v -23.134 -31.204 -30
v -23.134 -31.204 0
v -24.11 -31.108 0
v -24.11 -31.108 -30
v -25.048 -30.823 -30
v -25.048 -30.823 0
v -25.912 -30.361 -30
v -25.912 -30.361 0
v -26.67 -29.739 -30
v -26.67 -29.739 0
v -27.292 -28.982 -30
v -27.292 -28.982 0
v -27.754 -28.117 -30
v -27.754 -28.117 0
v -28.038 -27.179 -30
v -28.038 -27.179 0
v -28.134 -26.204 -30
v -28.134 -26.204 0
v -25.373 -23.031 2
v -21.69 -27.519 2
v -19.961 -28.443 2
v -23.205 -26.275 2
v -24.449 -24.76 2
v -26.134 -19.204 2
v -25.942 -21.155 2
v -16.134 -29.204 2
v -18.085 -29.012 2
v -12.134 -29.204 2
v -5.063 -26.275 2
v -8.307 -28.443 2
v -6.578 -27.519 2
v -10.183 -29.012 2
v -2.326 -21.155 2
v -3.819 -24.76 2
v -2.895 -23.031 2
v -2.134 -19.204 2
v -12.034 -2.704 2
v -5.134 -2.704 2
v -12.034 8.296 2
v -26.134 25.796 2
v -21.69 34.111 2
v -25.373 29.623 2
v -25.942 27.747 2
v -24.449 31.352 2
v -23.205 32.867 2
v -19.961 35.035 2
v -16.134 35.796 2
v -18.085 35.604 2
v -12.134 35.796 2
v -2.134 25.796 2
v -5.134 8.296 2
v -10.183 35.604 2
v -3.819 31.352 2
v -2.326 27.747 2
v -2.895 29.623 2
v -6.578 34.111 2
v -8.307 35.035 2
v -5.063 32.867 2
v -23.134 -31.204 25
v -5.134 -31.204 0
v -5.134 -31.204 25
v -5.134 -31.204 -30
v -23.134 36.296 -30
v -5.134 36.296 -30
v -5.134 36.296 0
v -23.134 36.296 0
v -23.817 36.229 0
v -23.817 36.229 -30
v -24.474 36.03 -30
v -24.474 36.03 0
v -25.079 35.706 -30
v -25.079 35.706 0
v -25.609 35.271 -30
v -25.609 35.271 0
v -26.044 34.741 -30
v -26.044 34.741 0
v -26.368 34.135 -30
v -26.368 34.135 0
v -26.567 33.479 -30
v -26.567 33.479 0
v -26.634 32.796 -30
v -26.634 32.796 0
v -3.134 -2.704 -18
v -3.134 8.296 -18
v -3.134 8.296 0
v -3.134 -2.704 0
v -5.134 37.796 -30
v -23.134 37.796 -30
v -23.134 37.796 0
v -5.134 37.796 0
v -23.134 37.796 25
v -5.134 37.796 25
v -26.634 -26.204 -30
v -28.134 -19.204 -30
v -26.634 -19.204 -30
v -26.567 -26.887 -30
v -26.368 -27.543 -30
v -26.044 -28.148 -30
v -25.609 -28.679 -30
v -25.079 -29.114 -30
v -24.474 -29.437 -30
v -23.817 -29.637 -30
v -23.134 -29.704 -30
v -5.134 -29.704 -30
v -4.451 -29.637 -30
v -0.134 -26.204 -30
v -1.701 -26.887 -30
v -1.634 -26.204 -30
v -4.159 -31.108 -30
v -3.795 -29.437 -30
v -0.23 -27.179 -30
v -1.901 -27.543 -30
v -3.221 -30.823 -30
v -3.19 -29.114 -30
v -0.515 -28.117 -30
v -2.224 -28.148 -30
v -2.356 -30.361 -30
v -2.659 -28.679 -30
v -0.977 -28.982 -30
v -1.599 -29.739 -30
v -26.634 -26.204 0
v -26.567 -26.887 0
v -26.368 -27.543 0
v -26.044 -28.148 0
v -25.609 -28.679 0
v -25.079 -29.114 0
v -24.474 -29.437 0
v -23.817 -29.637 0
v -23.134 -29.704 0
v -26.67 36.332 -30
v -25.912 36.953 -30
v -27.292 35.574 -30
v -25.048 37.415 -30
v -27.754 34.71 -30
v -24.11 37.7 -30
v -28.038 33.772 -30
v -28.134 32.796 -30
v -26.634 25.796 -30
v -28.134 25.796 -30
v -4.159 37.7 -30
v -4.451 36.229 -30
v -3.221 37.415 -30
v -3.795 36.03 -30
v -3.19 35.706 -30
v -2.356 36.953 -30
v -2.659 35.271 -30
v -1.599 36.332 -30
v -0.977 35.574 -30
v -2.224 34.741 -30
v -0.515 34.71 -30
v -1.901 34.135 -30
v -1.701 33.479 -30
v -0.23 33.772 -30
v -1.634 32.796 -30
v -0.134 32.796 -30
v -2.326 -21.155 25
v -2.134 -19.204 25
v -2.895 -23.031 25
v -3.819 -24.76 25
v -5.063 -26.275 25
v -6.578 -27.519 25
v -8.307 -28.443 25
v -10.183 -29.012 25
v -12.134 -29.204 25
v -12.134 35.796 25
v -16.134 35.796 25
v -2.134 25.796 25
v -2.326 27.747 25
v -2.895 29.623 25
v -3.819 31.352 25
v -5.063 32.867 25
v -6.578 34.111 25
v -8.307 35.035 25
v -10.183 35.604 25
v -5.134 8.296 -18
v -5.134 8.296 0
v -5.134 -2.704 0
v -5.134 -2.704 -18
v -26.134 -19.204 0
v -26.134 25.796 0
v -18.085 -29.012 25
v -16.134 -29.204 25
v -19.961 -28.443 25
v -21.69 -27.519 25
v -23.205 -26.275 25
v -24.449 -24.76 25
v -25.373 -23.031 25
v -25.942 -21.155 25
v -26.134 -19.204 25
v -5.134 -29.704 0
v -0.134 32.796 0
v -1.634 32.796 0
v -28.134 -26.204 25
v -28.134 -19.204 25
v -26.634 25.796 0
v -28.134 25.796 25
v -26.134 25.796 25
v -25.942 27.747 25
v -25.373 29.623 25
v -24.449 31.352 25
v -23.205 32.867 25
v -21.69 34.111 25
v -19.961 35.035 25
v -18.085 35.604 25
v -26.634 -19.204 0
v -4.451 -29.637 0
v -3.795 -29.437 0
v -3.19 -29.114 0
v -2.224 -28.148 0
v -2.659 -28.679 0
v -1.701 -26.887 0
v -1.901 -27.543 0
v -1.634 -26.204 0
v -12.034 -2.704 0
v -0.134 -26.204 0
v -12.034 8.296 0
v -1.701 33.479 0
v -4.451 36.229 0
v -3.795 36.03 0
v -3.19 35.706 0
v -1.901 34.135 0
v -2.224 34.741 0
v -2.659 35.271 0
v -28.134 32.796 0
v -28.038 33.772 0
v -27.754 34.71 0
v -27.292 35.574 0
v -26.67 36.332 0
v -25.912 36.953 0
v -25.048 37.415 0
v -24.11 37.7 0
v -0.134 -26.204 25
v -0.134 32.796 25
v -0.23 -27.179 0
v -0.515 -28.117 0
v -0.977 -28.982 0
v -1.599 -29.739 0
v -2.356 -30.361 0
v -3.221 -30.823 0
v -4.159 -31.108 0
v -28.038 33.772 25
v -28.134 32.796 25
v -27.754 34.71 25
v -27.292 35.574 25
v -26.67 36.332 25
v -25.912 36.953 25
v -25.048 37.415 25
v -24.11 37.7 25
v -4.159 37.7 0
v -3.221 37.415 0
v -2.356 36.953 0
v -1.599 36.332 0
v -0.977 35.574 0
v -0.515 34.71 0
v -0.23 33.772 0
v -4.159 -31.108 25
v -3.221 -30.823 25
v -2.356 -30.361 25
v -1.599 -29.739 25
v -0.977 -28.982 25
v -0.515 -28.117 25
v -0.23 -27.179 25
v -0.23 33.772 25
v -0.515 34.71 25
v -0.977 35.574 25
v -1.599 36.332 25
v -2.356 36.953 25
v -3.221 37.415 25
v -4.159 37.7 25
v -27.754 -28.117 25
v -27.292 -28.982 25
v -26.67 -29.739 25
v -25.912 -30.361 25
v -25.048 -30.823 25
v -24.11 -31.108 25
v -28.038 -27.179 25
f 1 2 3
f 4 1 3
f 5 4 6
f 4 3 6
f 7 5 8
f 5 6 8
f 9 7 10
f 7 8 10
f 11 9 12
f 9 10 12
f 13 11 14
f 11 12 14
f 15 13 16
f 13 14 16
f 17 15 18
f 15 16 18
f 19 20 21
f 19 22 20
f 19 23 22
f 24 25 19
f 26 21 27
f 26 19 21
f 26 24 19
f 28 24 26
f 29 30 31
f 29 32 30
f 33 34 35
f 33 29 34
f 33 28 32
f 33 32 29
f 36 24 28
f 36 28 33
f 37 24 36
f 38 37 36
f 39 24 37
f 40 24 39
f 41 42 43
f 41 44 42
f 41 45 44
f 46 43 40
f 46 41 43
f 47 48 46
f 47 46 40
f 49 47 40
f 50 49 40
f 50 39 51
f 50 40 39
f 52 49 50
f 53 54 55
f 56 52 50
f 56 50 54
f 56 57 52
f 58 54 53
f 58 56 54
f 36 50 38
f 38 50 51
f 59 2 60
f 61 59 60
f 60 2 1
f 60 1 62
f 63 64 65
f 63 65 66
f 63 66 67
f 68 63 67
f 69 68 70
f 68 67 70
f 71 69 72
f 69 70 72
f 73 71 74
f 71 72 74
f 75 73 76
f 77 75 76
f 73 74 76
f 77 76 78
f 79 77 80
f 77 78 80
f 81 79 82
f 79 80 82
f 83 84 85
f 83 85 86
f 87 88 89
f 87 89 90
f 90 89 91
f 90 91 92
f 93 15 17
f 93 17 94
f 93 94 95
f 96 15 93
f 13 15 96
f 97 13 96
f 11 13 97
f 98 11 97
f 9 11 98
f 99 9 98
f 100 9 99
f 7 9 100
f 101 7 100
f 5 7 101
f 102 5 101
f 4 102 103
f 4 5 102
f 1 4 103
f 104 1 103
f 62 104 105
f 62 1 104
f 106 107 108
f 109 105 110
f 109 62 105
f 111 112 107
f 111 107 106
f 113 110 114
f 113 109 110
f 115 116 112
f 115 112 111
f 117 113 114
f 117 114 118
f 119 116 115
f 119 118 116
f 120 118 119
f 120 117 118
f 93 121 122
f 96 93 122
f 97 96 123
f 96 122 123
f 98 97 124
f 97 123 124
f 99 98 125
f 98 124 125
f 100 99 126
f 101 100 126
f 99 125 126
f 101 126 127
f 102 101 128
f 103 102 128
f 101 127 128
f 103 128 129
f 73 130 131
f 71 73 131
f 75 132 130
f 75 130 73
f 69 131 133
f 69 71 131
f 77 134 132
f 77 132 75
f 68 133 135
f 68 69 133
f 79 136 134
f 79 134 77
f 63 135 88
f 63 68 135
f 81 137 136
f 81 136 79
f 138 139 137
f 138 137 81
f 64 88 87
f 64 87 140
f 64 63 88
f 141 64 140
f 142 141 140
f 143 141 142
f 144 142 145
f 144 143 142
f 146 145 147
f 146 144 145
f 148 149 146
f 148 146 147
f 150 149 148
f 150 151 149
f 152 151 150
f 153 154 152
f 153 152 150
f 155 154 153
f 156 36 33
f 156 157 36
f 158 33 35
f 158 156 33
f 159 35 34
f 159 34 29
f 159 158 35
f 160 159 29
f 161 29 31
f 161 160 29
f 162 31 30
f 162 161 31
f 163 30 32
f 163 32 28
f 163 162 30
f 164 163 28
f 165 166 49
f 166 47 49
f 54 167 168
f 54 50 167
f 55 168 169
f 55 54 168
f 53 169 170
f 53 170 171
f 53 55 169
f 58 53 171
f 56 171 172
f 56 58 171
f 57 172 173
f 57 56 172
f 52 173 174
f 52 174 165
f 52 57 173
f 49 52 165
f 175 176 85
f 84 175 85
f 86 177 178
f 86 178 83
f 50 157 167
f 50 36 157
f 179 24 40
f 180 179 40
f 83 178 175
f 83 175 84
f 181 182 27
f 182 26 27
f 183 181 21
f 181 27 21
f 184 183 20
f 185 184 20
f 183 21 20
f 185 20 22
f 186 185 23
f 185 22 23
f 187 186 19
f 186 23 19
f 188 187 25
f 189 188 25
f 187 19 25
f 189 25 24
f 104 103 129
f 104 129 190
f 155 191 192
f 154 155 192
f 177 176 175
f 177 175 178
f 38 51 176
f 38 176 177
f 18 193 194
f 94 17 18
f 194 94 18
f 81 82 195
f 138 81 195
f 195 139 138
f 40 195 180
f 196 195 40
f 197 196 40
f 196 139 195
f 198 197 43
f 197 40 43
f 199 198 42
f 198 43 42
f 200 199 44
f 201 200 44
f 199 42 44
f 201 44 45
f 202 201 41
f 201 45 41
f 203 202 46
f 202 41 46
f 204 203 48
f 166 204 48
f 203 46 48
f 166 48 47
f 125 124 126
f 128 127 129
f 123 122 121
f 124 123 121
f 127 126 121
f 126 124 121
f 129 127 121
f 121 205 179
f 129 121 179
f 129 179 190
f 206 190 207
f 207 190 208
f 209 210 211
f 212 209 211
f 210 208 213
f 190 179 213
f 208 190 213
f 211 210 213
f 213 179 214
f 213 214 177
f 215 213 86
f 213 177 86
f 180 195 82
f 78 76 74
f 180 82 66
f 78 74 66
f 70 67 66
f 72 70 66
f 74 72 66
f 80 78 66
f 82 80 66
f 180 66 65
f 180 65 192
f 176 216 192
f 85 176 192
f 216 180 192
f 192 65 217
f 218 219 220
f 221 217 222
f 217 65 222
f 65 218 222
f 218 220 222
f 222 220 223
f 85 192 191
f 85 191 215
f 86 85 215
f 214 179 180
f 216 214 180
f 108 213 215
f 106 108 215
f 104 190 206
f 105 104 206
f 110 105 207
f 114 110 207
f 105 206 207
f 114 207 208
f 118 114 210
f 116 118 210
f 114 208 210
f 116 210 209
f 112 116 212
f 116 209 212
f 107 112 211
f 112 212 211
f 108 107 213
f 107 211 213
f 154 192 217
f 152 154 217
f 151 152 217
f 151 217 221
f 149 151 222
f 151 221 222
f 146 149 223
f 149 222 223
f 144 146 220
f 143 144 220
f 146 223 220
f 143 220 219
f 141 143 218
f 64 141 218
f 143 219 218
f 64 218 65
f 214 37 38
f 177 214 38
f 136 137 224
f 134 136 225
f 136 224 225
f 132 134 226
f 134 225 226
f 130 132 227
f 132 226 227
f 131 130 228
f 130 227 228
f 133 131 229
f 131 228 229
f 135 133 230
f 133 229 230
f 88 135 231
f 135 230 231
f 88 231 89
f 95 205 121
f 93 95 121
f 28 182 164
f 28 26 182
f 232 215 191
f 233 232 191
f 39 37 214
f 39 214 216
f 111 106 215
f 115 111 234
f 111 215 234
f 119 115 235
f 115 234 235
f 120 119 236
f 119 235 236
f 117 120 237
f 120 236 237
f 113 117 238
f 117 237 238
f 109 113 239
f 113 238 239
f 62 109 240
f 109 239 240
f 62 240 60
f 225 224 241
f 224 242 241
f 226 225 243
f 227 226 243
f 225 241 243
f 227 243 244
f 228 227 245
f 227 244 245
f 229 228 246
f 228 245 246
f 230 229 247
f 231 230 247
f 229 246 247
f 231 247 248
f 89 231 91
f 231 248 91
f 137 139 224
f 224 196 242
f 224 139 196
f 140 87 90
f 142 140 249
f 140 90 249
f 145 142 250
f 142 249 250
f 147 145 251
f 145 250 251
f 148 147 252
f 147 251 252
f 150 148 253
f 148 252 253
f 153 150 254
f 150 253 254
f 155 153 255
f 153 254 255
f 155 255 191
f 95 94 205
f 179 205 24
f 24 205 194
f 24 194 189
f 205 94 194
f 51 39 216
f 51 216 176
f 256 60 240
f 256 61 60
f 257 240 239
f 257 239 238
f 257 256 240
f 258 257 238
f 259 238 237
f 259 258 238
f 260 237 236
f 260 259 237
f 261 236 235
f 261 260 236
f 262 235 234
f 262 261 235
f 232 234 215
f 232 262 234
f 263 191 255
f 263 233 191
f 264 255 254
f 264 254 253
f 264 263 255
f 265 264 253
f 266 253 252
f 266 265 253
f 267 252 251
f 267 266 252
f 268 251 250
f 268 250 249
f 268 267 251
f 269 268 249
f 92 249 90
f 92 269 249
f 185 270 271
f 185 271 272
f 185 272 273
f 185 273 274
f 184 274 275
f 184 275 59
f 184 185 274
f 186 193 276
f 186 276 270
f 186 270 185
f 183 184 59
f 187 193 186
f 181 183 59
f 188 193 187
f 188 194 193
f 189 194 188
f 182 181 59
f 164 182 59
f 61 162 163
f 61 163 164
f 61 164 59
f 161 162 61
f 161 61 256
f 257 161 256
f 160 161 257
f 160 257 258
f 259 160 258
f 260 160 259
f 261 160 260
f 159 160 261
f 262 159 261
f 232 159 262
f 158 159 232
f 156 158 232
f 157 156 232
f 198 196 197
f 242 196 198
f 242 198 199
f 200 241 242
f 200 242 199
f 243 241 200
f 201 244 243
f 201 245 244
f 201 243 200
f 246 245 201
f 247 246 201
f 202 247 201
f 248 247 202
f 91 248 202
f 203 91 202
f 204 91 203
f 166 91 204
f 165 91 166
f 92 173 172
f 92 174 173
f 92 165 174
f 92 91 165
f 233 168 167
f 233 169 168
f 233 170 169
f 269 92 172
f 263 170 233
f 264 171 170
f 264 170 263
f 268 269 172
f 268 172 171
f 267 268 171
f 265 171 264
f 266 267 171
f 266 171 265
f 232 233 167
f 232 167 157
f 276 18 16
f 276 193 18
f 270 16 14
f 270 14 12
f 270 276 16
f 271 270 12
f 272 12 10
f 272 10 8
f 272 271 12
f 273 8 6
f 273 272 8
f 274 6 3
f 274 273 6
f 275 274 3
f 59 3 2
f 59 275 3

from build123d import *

# Parameters (mm, degrees)
F0_W      = 28
F0_H      = 69
F1_DEPTH  = 25
F2_T      = -2
F3_R      = 5
F4_R      = 10
F5_W      = 6.9
F5_H      = 11
F6_DEPTH  = 25
F7_W      = 2
F7_H      = 45
F8_DEPTH  = 25
F10_W     = 2
F10_H     = 11
F11_DEPTH = 18
F12_DEPTH = 30


with BuildPart() as f1:
    # F0 (on Top) → F1 (new body)
    with BuildSketch(Plane.XY):
        with Locations((-14.1341709197, 3.2960948795)):
            Rectangle(F0_W, F0_H)
    extrude(amount=F1_DEPTH)

    # F2
    f2_openings = [f1.faces().sort_by_distance(p)[0] for p in [
        (-14.134171, 3.296095, 25),
    ]]
    offset(amount=F2_T, openings=f2_openings)

    # F3
    f3_edges = [f1.edges().sort_by_distance(p)[0] for p in [
        (-0.134171, -31.203905, 12.5),
        (-28.134171, -31.203905, 12.5),
        (-0.134171, 37.796095, 12.5),
        (-28.134171, 37.796095, 12.5),
    ]]
    fillet(f3_edges, radius=F3_R)

    # F4
    f4_edges = [f1.edges().sort_by_distance(p)[0] for p in [
        (-26.134171, 35.796095, 13.5),
        (-26.134171, -29.203905, 13.5),
        (-2.134171, -29.203905, 13.5),
        (-2.134171, 35.796095, 13.5),
    ]]
    fillet(f4_edges, radius=F4_R)

    # F5 (on face) → F6 (cut)
    with BuildSketch(Plane.XY.offset(2)):
        with Locations((-8.5841709197, 2.7960948795)):
            Rectangle(F5_W, F5_H)
    extrude(amount=-F6_DEPTH, mode=Mode.SUBTRACT)

    # F7 (on face) → F8 (cut)
    with BuildSketch(Plane.XY.offset(25)):
        with Locations((-27.1341709197, 3.2960948795)):
            Rectangle(F7_W, F7_H)
    extrude(amount=-F8_DEPTH, mode=Mode.SUBTRACT)

    # F10 (on face) → F11 (join)
    with BuildSketch(Plane(origin=(0, 0, 0), x_dir=(1, 0, 0), z_dir=(0, 0, -1))):
        with Locations((-4.1341709197, -2.7960948795)):
            Rectangle(F10_W, F10_H)
    extrude(amount=F11_DEPTH)

    # F10 (on face) → F12 (join)
    with BuildSketch(Plane(origin=(0, 0, 0), x_dir=(1, 0, 0), z_dir=(0, 0, -1))):
        with BuildLine():
            ThreePointArc((-1.6341702342, -32.7960948795), (-2.6592967008, -35.2709690983), (-5.1341709197, -36.296095565))
            Line((-5.1341709197, -36.296095565), (-23.1341709197, -36.296095565))
            ThreePointArc((-23.1341709197, -36.296095565), (-25.6090451385, -35.2709690983), (-26.6341716051, -32.7960948795))
            Line((-26.6341716051, -32.7960948795), (-26.6341716051, -25.7960948795))
            Line((-26.6341716051, -25.7960948795), (-28.1341709197, -25.7960948795))
            Line((-28.1341709197, -25.7960948795), (-28.1341709197, -32.7960948795))
            ThreePointArc((-28.1341709197, -32.7960948795), (-26.6697048256, -36.3316287854), (-23.1341709197, -37.7960948795))
            Line((-23.1341709197, -37.7960948795), (-5.1341709197, -37.7960948795))
            ThreePointArc((-5.1341709197, -37.7960948795), (-1.5986370137, -36.3316287854), (-0.1341709197, -32.7960948795))
            Line((-0.1341709197, -32.7960948795), (-1.6341702342, -32.7960948795))
        make_face()
        with BuildLine():
            Line((-1.6341709197, 26.2039051205), (-0.1341709197, 26.2039051205))
            ThreePointArc((-0.1341709197, 26.2039051205), (-1.5986370137, 29.7394390264), (-5.1341709197, 31.2039051205))
            Line((-5.1341709197, 31.2039051205), (-23.1341709197, 31.2039051205))
            ThreePointArc((-23.1341709197, 31.2039051205), (-26.6697048256, 29.7394390264), (-28.1341709197, 26.2039051205))
            Line((-28.1341709197, 26.2039051205), (-28.1341709197, 19.2039051205))
            Line((-28.1341709197, 19.2039051205), (-26.6341709197, 19.2039051205))
            Line((-26.6341709197, 19.2039051205), (-26.6341709197, 26.2039051205))
            ThreePointArc((-26.6341709197, 26.2039051205), (-25.6090446538, 28.6787788546), (-23.1341709197, 29.7039051205))
            Line((-23.1341709197, 29.7039051205), (-5.1341709197, 29.7039051205))
            ThreePointArc((-5.1341709197, 29.7039051205), (-2.6592971855, 28.6787788546), (-1.6341709197, 26.2039051205))
        make_face()
    extrude(amount=F12_DEPTH)


solid = f1.part
